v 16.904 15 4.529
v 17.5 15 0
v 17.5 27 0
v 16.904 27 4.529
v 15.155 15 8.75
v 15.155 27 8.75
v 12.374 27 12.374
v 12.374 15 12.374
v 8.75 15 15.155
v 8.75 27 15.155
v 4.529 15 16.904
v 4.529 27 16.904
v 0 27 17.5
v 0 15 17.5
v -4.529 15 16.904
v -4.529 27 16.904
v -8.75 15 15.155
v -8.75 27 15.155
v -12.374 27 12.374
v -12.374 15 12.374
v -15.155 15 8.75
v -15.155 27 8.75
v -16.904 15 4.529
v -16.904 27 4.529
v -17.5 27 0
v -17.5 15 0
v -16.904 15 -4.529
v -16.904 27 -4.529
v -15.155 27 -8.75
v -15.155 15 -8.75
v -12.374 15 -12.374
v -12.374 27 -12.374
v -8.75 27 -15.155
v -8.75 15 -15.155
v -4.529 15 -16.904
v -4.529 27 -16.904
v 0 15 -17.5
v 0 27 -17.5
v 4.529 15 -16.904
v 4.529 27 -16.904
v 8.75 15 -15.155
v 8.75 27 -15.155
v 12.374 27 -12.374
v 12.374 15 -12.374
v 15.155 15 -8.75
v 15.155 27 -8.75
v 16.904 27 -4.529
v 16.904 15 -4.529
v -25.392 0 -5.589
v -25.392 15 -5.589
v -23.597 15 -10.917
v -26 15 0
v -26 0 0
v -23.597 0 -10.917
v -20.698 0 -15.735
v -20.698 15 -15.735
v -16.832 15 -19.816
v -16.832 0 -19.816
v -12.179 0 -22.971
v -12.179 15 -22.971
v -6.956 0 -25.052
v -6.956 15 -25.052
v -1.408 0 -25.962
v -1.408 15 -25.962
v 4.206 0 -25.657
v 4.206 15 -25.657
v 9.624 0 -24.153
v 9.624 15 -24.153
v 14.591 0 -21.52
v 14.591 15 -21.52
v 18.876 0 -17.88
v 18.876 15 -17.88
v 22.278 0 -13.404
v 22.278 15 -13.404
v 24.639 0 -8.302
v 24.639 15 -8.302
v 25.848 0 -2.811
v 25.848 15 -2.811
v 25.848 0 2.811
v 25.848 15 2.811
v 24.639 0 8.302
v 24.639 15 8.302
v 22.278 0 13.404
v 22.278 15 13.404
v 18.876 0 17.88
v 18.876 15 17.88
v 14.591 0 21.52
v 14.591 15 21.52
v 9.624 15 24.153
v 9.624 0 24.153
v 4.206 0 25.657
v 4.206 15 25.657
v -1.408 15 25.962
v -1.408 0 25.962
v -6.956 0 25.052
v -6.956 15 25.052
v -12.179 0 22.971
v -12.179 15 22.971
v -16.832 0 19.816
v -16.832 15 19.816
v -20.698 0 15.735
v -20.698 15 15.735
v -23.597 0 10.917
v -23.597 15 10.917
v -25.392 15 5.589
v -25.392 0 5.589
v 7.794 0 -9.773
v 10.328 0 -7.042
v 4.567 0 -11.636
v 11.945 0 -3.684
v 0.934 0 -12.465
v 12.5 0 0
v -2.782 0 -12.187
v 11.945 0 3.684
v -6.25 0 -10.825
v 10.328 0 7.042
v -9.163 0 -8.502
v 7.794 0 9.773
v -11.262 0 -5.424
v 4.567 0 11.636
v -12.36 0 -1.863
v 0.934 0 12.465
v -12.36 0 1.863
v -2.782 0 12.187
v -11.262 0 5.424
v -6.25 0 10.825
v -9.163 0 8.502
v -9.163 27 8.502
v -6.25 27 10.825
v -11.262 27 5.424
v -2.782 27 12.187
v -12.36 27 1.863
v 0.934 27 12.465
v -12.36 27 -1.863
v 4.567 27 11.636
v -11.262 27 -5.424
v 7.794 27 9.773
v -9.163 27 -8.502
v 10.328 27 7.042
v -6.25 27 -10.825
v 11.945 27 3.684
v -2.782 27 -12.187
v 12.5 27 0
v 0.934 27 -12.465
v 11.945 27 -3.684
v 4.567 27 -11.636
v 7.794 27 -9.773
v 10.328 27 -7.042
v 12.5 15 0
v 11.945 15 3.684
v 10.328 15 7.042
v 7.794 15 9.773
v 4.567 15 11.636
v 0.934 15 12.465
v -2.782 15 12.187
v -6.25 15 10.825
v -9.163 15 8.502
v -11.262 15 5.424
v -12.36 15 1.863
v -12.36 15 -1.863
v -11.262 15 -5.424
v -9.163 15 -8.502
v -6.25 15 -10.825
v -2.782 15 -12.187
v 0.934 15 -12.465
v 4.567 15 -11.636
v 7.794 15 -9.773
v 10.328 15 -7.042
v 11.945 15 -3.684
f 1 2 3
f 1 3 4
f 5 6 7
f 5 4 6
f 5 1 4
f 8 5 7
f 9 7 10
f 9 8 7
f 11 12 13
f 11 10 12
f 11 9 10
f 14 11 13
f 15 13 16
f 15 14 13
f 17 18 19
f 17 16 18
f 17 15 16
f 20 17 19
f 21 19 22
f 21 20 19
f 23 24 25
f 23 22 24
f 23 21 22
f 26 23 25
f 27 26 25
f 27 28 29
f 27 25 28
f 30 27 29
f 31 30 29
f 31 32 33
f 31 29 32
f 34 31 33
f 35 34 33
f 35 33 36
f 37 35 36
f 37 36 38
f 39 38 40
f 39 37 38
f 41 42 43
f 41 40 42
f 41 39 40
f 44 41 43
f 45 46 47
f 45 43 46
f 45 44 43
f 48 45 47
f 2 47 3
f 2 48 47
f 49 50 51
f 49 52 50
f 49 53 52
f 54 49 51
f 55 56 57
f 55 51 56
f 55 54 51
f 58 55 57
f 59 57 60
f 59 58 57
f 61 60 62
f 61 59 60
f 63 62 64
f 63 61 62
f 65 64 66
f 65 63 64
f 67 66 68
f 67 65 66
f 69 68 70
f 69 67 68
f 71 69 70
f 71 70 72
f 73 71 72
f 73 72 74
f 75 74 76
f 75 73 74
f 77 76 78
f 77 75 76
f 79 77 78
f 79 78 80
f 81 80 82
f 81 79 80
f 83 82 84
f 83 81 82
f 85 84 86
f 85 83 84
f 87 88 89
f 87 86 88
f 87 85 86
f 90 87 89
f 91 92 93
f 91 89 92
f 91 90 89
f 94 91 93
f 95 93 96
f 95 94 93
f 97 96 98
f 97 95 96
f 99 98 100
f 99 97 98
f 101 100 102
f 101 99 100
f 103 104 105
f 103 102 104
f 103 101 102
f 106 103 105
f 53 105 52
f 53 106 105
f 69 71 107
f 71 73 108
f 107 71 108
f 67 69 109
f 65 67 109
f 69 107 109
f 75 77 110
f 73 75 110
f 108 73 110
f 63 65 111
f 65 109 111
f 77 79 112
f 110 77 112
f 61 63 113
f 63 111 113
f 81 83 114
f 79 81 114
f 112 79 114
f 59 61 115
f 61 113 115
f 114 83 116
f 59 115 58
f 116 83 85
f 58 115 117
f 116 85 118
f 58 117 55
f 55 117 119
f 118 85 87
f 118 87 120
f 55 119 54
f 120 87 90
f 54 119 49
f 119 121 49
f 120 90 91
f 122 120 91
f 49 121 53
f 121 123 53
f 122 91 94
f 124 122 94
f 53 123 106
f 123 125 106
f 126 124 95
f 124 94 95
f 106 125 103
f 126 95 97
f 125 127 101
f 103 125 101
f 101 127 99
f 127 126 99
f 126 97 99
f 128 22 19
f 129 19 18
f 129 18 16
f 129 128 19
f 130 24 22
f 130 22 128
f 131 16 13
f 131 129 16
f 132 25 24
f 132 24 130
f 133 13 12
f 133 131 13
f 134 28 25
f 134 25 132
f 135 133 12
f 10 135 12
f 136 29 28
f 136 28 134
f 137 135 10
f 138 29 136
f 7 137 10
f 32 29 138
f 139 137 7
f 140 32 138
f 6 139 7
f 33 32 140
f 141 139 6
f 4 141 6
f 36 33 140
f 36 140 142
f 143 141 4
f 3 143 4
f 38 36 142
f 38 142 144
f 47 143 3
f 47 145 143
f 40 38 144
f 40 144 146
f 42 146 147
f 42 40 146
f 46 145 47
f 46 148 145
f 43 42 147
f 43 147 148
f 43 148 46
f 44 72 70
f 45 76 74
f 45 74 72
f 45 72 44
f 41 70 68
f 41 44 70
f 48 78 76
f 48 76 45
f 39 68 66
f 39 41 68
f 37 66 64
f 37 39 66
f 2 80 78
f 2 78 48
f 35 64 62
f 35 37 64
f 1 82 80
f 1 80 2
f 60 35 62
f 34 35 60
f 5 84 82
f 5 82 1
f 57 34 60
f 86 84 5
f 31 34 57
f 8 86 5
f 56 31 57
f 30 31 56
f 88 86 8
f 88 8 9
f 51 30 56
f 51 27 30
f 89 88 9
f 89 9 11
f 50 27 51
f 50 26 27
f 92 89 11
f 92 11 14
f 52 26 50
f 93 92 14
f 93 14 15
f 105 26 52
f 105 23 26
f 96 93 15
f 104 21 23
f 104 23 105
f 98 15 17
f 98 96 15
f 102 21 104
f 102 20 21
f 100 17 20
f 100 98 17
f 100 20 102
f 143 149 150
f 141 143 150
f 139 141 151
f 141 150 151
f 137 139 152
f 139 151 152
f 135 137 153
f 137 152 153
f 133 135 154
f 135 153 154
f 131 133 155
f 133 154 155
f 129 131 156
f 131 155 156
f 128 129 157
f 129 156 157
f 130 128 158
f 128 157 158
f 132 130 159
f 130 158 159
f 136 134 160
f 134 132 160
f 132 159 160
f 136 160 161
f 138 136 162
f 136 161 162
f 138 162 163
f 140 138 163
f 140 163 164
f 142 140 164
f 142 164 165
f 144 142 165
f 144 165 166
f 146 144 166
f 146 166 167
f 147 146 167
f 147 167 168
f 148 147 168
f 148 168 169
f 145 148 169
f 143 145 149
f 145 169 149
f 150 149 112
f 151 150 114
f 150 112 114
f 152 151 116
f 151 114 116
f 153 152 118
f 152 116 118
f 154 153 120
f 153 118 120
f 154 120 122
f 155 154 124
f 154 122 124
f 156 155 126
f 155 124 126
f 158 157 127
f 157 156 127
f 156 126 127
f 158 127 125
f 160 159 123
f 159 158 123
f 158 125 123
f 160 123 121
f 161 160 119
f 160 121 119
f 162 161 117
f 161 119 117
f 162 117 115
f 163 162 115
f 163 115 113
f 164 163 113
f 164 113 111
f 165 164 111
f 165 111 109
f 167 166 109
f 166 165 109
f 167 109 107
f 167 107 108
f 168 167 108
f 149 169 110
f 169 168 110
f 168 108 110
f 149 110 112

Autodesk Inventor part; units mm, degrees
ref_plane "YZ Plane" through (0, 0, 0) normal (1, 0, 0) x (0, 1, 0)
ref_plane "XZ Plane" through (0, 0, 0) normal (0, 1, 0) x (-1, 0, 0)
ref_plane "XY Plane" through (0, 0, 0) normal (0, 0, 1) x (1, 0, 0)
sketch "Эскиз1" plane through (0, 0, 0) normal (0, 1, 0) x (-1, 0, 0)
  circle A0 centre (0, 0) radius 26
  dimension "d0" = 52
extrude "Выдавливание1" add sketch "Эскиз1" along normal blind 15
sketch "Эскиз2" plane through (0, 15, 0) normal (0, 1, 0) x (1, 0, 0)
  circle A0 centre (0, 0) radius 17.5
  circle A1 centre (0, 0) radius 12.5
  dimension "d3" = 25
  dimension "d4" = 35
extrude "Выдавливание2" add sketch "Эскиз2" along normal blind 12
sketch "Эскиз3" plane through (0, 0, 0) normal (0, -1, 0) x (1, 0, 0)
  circle A0 centre (0, 0) radius 12.5
  dimension "d7" = 25
extrude "Выдавливание3" cut sketch "Эскиз3" against normal blind 15
properties part number "подшипник"
